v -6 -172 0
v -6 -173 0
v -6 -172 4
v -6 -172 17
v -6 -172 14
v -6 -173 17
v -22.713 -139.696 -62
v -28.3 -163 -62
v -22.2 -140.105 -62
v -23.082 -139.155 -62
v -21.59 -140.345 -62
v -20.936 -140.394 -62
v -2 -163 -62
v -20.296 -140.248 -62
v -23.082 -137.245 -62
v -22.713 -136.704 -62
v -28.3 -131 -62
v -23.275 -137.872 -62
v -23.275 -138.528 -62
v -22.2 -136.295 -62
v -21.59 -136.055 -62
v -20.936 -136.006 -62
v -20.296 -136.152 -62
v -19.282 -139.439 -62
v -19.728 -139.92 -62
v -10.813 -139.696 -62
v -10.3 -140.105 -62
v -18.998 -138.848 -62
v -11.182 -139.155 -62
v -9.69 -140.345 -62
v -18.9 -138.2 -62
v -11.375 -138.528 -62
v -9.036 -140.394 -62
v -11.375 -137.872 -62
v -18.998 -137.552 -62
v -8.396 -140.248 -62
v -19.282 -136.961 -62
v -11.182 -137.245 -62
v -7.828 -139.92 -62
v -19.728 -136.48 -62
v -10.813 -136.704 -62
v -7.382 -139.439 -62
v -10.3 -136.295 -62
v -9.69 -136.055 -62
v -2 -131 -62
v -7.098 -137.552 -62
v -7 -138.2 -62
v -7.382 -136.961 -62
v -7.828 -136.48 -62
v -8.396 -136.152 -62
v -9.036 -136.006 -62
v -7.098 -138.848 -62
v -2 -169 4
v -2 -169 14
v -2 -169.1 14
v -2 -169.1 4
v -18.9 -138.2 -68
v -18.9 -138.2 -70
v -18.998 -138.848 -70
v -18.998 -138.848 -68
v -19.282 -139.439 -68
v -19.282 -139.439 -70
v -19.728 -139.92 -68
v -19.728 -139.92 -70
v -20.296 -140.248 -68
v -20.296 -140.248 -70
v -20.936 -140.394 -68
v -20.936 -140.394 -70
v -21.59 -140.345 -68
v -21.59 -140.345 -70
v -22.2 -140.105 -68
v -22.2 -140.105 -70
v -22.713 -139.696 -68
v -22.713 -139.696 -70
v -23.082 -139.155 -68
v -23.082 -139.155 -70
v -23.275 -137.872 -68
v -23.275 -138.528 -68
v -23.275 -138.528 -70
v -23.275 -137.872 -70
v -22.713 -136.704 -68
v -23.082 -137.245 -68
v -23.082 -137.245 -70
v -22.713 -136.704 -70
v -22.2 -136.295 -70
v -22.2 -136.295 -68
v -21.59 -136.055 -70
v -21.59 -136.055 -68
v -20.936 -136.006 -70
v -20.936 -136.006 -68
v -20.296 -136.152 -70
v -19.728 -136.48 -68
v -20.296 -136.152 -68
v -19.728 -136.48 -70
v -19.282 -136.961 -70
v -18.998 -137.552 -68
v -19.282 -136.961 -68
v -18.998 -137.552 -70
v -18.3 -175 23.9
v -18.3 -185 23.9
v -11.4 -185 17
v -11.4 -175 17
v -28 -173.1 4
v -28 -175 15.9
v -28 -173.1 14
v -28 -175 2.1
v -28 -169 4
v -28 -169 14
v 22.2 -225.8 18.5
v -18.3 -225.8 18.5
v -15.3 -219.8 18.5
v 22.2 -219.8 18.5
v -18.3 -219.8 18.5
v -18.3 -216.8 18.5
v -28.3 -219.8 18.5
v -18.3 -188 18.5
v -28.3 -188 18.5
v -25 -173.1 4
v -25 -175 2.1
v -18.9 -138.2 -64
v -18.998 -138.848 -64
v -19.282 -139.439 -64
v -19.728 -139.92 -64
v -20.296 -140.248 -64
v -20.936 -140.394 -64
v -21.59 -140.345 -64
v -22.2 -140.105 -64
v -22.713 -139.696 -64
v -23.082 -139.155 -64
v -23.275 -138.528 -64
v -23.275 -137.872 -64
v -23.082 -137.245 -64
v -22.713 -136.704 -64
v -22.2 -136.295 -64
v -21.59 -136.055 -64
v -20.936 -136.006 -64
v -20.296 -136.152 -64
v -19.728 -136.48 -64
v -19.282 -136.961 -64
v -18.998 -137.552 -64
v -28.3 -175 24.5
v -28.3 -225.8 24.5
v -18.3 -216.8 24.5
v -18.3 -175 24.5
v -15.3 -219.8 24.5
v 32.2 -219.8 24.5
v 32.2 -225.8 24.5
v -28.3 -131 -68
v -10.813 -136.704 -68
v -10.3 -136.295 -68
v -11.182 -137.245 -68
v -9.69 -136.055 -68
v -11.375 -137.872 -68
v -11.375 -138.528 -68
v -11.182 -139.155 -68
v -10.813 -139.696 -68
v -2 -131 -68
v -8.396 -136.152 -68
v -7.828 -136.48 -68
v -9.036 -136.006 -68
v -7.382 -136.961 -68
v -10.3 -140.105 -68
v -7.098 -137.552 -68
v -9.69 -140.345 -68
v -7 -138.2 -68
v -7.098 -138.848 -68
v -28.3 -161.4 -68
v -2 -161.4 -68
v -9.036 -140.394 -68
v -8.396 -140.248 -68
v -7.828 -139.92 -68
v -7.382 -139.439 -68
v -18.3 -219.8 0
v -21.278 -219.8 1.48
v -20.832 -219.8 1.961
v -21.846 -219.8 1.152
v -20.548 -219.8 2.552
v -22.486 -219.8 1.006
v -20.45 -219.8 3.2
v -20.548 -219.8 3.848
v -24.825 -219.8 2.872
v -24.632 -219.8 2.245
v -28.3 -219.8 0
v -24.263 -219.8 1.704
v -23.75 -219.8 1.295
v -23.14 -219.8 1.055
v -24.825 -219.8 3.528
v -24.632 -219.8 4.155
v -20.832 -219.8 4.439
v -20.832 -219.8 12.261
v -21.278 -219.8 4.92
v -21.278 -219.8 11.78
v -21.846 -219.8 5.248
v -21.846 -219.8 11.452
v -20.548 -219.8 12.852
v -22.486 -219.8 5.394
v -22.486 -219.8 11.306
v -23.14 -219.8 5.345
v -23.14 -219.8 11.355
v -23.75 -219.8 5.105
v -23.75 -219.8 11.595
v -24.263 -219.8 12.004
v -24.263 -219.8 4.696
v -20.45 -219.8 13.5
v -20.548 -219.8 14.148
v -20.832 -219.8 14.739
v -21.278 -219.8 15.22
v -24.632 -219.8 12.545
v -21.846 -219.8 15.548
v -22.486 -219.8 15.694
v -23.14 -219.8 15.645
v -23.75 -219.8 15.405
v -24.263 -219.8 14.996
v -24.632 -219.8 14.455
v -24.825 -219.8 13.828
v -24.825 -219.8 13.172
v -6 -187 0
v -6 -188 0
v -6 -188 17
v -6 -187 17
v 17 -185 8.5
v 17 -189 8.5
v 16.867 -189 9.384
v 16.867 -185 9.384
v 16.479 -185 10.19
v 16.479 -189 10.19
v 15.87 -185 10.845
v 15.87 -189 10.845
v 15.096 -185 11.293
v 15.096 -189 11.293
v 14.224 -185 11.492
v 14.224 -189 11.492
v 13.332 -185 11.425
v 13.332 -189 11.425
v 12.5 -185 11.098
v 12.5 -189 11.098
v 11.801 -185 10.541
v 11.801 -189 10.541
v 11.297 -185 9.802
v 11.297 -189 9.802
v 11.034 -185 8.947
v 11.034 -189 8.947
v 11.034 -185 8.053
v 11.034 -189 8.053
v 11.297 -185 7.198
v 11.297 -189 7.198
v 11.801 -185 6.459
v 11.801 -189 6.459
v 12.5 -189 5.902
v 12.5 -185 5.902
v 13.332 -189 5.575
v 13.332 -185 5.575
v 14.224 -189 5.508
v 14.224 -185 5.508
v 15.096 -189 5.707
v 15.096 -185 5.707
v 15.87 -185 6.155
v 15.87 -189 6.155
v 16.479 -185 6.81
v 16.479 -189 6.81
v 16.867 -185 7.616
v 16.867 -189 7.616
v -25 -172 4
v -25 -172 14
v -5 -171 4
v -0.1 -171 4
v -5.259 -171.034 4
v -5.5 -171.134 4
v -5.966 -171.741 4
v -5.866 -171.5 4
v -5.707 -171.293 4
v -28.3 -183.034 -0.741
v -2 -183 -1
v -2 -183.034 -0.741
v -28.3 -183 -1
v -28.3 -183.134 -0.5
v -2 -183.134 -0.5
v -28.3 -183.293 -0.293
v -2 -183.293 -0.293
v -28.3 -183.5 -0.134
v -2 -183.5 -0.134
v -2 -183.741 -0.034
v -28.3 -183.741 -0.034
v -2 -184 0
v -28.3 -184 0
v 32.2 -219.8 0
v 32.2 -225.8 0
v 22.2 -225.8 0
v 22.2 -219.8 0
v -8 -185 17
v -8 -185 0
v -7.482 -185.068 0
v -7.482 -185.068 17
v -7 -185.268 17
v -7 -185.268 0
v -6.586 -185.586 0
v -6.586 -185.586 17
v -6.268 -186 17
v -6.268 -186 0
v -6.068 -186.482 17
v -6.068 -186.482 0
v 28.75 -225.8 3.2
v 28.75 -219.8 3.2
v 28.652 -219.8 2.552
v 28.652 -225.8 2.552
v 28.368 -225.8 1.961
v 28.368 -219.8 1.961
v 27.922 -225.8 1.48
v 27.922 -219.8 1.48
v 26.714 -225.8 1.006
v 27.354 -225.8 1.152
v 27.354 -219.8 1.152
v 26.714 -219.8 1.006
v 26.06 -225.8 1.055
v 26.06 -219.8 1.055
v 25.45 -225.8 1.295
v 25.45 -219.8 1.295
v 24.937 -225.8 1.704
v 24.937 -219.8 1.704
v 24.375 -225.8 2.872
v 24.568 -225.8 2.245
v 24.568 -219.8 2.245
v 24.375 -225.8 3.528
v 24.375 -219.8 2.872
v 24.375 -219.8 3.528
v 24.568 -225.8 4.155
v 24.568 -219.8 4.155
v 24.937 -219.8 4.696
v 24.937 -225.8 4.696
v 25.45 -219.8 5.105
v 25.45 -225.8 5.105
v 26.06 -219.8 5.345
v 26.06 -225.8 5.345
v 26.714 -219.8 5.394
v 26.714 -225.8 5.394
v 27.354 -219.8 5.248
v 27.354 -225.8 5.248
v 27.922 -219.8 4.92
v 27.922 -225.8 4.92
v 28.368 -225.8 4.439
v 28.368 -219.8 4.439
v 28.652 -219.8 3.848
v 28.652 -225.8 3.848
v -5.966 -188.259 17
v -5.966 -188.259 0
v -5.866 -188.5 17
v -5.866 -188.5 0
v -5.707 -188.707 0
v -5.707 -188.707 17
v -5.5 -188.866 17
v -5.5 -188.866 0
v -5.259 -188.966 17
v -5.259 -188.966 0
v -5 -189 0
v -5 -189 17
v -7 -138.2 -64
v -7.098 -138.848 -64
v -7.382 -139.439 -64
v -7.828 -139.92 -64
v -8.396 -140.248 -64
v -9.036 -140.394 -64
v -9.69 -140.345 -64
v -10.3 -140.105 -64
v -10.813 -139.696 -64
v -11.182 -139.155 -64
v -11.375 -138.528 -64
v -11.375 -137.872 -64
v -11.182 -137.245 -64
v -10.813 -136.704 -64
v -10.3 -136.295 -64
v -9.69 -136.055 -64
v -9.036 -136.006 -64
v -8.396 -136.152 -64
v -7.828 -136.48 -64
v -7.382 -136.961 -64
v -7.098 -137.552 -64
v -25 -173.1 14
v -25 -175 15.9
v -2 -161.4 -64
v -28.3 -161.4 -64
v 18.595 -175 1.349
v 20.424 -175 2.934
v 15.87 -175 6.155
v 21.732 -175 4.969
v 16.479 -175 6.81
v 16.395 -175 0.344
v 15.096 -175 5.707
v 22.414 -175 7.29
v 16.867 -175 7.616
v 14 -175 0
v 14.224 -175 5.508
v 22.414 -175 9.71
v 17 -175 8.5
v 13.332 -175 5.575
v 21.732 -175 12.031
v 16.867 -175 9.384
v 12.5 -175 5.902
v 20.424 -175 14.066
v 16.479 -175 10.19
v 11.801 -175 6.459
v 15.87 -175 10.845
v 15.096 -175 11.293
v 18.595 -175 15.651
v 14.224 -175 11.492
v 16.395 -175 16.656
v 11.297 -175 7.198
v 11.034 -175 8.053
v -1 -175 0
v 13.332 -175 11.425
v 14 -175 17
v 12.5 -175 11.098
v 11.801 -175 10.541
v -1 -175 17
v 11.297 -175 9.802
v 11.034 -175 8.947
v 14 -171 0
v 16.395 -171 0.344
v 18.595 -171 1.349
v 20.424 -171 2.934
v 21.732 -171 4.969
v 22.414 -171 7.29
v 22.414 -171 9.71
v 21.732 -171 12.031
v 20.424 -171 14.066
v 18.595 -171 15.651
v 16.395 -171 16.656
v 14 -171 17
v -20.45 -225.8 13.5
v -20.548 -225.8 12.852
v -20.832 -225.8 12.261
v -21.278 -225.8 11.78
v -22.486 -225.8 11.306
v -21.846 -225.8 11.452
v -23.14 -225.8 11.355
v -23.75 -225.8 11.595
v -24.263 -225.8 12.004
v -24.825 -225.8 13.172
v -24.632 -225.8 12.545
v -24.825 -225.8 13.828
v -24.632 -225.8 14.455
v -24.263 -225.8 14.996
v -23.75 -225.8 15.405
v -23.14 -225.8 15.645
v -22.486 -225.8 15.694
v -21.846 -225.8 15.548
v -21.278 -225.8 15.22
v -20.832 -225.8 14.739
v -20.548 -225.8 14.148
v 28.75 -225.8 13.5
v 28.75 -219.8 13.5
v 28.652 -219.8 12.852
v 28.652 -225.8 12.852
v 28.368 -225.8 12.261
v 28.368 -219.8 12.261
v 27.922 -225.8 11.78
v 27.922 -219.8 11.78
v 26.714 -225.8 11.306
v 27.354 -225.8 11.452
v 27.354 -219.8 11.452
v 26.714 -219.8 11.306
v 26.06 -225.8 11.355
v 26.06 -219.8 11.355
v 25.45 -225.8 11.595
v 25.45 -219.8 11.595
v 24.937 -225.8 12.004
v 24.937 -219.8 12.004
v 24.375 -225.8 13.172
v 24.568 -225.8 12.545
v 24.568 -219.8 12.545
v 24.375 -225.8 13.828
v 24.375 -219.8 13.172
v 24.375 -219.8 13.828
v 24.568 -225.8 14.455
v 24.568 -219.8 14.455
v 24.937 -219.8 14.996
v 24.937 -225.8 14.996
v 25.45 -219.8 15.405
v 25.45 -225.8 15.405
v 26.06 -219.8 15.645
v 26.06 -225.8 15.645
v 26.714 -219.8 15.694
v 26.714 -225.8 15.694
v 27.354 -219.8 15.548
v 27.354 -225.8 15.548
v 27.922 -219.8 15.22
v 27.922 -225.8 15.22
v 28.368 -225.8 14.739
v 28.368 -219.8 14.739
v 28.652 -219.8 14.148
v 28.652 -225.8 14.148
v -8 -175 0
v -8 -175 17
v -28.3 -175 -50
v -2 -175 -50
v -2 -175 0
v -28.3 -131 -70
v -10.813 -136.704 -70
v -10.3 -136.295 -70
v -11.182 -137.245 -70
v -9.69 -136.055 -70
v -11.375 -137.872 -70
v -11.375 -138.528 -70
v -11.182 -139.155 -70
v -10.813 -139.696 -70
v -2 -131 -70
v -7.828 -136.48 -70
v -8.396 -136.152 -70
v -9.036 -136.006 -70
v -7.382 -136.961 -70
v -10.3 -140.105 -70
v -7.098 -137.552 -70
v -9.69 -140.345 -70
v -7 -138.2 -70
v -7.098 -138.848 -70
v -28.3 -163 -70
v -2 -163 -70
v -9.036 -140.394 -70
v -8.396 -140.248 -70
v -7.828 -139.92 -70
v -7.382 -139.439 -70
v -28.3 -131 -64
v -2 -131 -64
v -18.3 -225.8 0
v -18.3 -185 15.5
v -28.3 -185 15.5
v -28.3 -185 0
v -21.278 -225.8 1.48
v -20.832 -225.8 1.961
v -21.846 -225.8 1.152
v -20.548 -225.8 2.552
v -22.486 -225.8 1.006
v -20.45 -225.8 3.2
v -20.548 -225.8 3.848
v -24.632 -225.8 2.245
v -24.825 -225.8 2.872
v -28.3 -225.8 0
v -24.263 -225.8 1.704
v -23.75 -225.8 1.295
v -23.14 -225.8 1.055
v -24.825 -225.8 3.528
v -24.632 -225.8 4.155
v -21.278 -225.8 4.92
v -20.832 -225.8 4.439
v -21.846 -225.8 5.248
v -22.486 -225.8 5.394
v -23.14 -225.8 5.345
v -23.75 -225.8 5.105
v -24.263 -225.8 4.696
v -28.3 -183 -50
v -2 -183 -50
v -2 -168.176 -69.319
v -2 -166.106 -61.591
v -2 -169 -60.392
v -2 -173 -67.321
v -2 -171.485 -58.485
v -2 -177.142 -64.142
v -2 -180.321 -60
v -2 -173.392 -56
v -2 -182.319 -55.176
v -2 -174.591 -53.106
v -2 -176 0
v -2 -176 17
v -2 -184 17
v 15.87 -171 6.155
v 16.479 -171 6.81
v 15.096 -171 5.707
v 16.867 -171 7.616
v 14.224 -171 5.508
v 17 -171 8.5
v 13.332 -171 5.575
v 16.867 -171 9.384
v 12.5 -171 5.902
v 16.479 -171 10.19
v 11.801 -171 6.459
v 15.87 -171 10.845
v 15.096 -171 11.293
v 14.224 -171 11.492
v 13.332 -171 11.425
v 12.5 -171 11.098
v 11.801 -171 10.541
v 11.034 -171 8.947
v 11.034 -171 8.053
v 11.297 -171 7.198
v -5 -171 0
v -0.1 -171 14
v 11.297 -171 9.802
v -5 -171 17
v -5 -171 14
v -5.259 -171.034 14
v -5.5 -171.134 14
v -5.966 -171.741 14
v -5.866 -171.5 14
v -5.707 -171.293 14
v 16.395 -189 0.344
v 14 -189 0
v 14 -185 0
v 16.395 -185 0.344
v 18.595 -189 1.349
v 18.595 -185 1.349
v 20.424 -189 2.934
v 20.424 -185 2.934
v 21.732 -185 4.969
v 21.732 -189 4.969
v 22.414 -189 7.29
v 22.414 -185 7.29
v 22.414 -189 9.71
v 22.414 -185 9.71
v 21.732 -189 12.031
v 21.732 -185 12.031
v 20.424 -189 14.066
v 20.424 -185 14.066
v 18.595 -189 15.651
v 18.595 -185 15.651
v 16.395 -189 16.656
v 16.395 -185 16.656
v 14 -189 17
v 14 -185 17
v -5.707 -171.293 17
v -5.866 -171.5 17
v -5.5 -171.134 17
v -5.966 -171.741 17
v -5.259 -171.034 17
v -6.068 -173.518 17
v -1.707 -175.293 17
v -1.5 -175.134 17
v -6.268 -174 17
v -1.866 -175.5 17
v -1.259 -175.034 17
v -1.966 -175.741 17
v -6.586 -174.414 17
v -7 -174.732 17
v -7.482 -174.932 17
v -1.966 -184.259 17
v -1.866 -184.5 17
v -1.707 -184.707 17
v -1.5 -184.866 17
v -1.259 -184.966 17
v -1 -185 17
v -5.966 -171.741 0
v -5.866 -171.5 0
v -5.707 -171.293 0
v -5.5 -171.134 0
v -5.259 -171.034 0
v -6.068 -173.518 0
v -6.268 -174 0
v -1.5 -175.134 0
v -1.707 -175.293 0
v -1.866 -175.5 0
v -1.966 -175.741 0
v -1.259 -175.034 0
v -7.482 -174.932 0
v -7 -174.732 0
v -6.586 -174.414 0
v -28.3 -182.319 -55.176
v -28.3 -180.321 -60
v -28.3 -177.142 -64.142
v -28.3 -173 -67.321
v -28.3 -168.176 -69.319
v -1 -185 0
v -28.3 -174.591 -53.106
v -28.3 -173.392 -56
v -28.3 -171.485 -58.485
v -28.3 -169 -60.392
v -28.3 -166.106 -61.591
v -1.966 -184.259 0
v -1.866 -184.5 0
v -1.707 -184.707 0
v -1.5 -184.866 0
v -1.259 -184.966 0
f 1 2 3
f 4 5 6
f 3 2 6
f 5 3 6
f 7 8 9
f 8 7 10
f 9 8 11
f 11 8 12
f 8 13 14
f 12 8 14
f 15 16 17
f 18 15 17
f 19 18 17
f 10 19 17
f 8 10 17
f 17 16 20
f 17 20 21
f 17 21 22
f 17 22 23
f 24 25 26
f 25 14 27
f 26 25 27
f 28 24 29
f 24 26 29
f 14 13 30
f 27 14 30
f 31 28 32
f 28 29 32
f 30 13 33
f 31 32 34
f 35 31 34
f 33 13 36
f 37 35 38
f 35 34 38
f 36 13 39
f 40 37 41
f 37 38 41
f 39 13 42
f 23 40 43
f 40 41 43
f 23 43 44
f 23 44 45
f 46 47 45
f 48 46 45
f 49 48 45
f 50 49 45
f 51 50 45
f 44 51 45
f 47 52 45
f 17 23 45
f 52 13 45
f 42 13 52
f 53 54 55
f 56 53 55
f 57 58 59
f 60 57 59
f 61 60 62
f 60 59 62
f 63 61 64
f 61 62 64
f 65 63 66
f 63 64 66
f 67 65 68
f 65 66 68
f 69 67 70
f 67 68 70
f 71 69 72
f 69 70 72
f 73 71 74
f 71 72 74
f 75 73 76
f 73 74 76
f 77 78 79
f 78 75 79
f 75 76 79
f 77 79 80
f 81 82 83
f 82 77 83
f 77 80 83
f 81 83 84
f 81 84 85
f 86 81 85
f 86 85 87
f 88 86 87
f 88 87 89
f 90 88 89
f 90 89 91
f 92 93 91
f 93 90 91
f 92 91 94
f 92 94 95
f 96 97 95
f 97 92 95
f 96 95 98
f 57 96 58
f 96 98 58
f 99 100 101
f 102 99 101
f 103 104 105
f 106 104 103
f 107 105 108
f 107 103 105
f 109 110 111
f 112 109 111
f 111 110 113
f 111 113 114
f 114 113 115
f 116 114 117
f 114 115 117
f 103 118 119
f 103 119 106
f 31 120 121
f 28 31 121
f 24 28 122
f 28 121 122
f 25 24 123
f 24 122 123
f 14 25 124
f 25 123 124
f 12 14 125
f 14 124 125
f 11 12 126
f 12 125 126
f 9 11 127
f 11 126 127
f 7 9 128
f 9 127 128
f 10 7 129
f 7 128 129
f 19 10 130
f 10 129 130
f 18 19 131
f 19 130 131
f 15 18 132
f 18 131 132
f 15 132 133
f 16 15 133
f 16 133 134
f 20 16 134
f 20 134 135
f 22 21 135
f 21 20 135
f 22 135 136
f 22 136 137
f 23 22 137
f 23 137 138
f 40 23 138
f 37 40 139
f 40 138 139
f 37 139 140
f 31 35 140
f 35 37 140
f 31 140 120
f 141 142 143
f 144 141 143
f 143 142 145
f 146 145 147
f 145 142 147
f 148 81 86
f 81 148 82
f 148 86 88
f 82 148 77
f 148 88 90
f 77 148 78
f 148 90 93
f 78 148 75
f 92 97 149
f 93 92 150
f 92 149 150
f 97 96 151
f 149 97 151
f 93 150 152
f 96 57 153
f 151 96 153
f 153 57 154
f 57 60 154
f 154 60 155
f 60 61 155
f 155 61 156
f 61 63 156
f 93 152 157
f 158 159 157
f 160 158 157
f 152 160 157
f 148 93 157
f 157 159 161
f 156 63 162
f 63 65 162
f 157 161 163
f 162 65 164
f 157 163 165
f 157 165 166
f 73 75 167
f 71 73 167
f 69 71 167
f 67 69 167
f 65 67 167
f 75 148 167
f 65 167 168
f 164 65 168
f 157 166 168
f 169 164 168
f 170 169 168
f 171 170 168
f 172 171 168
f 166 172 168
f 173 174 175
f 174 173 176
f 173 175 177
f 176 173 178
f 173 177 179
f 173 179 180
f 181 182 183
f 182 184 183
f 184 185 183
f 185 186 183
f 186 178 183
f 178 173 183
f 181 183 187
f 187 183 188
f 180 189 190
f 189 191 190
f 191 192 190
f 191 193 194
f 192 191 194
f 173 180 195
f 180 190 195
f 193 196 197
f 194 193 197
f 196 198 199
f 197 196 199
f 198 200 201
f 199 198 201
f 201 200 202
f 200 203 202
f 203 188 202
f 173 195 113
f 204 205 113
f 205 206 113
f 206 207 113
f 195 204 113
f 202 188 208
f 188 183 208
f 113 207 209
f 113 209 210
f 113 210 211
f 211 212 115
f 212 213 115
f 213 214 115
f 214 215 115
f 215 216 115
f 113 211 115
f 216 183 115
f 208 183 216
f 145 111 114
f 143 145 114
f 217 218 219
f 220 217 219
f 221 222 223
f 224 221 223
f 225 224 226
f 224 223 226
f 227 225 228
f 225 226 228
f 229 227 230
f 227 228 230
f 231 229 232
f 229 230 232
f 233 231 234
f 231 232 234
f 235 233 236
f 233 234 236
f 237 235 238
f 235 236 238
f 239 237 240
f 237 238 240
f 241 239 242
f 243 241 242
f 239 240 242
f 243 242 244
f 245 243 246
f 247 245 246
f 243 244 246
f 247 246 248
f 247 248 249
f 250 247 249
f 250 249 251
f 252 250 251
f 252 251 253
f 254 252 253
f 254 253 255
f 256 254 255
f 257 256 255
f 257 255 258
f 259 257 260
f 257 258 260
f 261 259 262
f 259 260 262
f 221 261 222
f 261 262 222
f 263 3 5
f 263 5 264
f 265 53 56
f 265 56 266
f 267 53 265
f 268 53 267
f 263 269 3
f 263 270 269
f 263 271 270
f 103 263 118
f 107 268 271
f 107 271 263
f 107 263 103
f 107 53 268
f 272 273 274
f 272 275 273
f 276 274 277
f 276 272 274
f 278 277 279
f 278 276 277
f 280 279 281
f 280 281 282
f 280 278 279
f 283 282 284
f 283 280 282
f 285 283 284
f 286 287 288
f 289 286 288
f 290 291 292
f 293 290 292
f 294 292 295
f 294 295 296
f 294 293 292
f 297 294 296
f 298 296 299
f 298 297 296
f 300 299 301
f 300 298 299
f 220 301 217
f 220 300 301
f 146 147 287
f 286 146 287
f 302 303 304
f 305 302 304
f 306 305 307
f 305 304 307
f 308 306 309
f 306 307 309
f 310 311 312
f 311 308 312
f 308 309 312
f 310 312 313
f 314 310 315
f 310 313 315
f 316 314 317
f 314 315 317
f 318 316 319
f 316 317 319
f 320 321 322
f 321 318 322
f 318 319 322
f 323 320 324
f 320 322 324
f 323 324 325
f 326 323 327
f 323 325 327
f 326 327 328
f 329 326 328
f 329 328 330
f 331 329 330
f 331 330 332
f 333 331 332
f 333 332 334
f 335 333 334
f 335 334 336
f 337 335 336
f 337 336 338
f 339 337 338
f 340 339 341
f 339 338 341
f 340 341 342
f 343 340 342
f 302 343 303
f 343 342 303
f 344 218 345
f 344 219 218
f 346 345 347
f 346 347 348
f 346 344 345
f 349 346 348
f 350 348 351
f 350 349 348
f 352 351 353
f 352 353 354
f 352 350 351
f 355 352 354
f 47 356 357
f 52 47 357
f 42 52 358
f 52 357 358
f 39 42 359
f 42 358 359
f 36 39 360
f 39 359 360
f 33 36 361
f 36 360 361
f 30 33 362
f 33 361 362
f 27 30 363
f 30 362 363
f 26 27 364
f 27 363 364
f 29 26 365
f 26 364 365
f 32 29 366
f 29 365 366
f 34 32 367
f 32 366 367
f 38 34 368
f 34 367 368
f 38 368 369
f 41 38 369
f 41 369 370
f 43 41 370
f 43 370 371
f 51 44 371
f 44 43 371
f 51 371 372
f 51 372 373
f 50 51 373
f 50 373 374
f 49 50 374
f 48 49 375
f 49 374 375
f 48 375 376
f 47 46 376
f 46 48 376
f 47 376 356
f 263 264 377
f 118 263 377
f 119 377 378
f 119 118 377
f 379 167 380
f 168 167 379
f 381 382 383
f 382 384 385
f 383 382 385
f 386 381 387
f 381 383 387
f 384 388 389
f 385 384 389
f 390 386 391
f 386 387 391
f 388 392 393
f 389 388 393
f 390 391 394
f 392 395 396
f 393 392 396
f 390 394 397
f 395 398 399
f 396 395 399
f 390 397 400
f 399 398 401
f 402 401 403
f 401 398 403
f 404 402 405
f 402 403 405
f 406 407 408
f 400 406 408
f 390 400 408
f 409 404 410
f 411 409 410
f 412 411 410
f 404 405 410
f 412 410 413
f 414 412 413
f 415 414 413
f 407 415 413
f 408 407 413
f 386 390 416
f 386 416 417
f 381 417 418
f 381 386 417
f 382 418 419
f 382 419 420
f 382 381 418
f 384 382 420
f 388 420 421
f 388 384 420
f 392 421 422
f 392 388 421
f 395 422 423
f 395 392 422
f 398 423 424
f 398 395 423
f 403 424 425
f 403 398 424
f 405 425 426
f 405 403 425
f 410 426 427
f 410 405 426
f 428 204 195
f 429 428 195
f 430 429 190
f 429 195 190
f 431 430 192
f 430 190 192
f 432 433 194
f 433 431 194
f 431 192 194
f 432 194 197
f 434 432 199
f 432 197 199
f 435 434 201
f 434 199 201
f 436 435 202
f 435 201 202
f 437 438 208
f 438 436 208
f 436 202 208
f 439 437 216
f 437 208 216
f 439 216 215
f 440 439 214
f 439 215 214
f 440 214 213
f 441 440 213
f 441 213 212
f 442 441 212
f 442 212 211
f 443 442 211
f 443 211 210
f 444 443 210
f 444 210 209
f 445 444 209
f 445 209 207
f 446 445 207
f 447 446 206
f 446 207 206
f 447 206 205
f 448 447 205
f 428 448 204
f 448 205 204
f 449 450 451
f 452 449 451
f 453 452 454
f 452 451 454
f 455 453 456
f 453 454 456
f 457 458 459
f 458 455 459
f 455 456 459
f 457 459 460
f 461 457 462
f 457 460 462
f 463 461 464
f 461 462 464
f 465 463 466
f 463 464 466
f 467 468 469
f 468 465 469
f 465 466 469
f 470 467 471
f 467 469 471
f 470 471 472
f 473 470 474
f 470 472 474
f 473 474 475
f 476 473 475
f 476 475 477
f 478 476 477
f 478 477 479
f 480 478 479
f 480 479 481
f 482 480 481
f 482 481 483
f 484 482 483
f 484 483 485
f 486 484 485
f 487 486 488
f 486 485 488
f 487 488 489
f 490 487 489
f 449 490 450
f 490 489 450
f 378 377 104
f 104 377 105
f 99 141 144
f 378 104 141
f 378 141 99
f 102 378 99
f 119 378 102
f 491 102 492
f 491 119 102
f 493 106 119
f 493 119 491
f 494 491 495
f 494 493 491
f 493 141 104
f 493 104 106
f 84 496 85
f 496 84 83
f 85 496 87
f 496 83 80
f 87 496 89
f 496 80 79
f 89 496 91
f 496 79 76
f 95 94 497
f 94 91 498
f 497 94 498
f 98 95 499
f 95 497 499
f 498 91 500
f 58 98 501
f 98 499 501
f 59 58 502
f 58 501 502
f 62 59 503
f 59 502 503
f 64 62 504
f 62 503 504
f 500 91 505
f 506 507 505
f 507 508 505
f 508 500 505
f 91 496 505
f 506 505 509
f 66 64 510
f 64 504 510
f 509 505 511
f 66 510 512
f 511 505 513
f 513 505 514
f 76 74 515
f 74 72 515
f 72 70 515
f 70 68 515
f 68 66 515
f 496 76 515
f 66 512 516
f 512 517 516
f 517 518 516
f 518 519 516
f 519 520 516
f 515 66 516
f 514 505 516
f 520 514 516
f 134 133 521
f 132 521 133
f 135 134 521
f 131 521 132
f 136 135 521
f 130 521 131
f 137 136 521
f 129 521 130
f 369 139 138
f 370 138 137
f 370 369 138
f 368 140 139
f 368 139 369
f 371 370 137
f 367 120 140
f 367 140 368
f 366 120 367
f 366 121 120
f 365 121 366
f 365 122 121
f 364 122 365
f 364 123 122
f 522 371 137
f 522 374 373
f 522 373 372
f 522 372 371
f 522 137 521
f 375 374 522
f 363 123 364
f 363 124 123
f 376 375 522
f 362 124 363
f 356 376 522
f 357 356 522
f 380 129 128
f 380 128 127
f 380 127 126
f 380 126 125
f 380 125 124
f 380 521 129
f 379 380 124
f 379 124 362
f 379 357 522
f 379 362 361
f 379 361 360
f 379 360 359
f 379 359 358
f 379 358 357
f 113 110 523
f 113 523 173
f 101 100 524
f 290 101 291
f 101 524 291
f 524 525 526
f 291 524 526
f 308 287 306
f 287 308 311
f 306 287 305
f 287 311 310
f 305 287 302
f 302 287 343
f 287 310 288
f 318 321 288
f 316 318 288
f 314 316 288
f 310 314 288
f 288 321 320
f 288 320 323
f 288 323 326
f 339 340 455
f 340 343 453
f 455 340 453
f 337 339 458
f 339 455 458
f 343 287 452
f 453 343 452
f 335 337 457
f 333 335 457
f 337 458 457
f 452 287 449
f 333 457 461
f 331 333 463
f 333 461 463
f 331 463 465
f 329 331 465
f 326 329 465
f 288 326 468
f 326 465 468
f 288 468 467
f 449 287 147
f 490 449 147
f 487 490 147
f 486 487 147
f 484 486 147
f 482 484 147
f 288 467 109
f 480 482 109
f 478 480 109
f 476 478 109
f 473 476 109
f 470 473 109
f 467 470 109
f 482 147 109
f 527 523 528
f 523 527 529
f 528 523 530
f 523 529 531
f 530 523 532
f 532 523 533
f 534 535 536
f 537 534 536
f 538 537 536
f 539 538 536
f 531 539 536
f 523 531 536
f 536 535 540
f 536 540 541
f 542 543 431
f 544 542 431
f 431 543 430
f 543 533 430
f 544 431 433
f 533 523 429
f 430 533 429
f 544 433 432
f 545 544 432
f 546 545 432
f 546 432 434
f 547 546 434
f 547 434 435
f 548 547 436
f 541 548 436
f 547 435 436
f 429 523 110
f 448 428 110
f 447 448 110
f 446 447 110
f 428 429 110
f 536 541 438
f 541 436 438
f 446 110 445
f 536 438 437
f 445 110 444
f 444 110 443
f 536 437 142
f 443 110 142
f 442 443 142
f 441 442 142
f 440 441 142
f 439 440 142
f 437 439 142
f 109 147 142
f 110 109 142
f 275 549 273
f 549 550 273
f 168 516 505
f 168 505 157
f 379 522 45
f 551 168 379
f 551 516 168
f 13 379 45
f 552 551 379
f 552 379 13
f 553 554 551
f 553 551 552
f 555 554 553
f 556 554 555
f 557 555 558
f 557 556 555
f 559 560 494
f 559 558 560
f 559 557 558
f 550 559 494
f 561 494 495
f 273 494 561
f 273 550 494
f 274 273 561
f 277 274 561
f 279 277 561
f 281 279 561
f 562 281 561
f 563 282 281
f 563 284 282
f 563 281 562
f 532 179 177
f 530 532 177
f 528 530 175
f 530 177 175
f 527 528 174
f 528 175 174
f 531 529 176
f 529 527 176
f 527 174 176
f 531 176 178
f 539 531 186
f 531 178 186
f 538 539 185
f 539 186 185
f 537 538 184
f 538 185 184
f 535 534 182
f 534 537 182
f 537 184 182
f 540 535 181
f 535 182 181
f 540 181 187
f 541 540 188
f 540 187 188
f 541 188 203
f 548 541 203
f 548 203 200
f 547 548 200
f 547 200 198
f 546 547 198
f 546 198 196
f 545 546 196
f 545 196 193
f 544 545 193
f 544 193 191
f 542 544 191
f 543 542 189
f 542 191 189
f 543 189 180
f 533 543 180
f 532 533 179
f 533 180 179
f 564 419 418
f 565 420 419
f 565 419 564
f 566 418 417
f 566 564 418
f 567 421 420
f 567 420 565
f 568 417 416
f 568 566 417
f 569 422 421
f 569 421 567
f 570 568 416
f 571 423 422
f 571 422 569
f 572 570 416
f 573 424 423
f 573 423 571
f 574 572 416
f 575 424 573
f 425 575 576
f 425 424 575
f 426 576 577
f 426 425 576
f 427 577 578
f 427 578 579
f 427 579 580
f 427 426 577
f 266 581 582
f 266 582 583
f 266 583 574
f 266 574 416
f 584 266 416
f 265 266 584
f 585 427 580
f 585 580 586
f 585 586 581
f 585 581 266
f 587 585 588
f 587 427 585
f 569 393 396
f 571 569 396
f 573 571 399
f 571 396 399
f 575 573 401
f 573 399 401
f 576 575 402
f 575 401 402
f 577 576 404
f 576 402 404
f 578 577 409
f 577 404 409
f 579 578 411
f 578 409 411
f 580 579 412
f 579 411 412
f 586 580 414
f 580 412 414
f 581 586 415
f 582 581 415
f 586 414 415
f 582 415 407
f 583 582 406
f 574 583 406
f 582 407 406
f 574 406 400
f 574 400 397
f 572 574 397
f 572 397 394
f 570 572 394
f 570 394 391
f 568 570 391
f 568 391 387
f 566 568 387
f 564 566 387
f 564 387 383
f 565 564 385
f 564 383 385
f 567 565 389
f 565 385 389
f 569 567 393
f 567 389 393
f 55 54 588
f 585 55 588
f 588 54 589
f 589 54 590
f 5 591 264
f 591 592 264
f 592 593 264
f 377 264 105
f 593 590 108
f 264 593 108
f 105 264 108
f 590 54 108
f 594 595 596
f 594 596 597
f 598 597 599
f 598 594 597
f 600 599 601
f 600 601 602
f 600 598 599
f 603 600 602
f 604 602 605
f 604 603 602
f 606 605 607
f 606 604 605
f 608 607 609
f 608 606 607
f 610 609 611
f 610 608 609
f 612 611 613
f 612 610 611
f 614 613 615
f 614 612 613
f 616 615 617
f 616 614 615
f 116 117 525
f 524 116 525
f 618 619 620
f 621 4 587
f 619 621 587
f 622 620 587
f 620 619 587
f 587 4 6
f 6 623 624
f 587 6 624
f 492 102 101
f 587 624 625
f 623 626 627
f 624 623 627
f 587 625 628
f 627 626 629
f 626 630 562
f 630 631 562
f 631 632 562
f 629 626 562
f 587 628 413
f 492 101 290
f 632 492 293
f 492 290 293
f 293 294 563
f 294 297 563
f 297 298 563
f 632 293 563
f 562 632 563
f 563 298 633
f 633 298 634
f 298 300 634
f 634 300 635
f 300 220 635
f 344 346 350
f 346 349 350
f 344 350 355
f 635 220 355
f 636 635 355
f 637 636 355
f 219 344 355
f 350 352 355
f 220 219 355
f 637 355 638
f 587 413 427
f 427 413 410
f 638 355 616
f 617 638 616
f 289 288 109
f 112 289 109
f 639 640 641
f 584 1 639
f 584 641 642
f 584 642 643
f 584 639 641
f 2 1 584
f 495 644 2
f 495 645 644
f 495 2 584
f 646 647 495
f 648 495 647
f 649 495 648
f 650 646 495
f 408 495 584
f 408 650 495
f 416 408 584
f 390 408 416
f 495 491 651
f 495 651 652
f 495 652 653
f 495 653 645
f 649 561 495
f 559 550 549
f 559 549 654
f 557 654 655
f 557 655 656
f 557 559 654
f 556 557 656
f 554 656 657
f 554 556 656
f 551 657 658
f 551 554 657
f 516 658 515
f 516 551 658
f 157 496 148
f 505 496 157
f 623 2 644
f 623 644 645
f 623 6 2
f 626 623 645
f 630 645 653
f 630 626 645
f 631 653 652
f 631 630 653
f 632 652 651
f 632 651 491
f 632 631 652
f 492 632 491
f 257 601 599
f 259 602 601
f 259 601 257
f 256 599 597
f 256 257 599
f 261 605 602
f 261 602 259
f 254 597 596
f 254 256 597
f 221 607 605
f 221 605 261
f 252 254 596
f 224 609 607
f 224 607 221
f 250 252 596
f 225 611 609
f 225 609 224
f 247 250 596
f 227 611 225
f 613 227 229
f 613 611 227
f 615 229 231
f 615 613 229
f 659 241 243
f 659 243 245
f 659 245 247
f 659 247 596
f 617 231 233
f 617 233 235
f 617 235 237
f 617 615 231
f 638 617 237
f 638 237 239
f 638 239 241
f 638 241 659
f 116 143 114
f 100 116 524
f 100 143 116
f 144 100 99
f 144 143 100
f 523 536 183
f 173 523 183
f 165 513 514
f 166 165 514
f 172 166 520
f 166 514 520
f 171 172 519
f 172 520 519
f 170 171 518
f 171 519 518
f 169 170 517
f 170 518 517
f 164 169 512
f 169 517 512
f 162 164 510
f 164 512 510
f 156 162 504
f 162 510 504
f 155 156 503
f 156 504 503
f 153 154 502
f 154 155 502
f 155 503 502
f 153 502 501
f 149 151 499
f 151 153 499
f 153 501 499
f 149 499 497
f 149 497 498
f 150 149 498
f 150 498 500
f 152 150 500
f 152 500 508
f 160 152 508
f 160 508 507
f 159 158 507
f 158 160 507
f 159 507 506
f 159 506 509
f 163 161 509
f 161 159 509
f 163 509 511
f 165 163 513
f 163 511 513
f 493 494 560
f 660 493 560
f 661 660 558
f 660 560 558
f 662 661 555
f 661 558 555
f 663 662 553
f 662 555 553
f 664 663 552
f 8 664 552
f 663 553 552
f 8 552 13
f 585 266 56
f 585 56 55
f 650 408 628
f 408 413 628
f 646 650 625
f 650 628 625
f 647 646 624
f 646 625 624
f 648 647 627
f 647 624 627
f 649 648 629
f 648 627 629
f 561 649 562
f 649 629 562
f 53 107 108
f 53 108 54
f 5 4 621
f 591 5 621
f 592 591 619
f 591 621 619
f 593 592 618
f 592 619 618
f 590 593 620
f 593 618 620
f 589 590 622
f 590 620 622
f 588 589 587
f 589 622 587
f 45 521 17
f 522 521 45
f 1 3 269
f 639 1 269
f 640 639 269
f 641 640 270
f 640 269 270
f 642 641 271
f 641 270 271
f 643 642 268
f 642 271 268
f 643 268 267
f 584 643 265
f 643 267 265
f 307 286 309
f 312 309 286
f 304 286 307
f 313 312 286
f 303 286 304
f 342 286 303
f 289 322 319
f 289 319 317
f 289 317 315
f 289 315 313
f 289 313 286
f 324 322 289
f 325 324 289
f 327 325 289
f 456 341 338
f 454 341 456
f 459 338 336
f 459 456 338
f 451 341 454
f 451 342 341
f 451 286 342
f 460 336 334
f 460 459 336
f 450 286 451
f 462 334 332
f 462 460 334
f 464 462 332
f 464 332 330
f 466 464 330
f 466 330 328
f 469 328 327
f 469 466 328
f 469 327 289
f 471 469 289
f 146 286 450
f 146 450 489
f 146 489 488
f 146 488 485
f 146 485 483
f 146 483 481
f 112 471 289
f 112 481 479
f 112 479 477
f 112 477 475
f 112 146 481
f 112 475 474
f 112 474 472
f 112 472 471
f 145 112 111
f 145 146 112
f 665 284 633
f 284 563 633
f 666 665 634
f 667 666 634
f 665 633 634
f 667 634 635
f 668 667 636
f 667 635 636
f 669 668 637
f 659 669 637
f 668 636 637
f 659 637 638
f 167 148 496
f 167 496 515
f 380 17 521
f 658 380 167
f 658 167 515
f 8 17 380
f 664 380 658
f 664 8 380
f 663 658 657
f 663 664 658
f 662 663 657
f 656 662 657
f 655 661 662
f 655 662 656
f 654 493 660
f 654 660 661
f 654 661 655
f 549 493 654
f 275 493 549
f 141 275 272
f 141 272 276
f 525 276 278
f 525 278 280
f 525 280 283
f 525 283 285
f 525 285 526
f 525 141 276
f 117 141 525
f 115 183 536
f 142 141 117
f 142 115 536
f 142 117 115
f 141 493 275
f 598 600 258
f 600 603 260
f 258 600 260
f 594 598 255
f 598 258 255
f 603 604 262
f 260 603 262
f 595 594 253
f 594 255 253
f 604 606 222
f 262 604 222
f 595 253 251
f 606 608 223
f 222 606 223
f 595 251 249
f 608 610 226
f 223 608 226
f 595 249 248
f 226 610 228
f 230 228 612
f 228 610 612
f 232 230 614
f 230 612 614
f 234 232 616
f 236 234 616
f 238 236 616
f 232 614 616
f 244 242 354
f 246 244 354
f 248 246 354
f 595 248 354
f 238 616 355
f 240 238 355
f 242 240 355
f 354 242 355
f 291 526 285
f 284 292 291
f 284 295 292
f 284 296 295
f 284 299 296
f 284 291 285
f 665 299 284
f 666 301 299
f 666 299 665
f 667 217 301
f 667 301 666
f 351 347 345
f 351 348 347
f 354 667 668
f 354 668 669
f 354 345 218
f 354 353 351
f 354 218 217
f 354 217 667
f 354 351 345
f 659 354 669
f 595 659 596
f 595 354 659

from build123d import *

# Parameters (mm, degrees)
CYLINDER041_R          = 2.2
CYLINDER041_DEPTH      = 26
ARRAY015_X_COUNT       = 2
ARRAY015_X_PITCH       = 11.9
BOX056_W               = 26.3
BOX056_H               = 84
BOX056_DEPTH           = 8
BOX055_W               = 26.3
BOX055_H               = 144.8
BOX055_DEPTH           = 4
PAD070_DEPTH           = 10
PAD071_DEPTH           = 6
BOX054_W               = 80
BOX054_H               = 100
BOX054_DEPTH           = 100
BOX053_W               = 40
BOX053_H               = 84
BOX053_DEPTH           = 10
PAD065_DEPTH           = 10
PAD064_DEPTH           = 10
BOX051_W               = 12
BOX051_H               = 10
BOX051_DEPTH           = 30
CYLINDER039_R          = 2.2
CYLINDER039_DEPTH      = 18
CYLINDER039_ROLL_ANGLE = -90
ARRAY013_X_COUNT       = 2
ARRAY013_X_PITCH       = 49.2
ARRAY013_Z_COUNT       = 2
ARRAY013_Z_PITCH       = 10.3
PAD061_DEPTH           = 6
PAD060_DEPTH           = 10
BOX052_W               = 12
BOX052_H               = 10
BOX052_DEPTH           = 30
CYLINDER040_R          = 2.2
CYLINDER040_DEPTH      = 18
CYLINDER040_ROLL_ANGLE = -90
ARRAY014_X_COUNT       = 2
ARRAY014_X_PITCH       = 49.2
ARRAY014_Z_COUNT       = 2
ARRAY014_Z_PITCH       = 10.3
PAD063_DEPTH           = 6
PAD062_DEPTH           = 10
BOX050_W               = 16.3
BOX050_H               = 10
BOX050_DEPTH           = 17
SKETCH057_R            = 3
PAD058_DEPTH           = 4
SKETCH058_R            = 3
PAD059_DEPTH           = 4
BOX049_W               = 20
BOX049_H               = 17
BOX049_DEPTH           = 10
FILLET021_R            = 1
FILLET021_ROLL_ANGLE   = 90
FILLET022_1_R          = 2
FILLET022_2_R          = 1
BOX046_W               = 16.3
BOX046_H               = 10
BOX046_DEPTH           = 17
SKETCH053_R            = 3
PAD055_DEPTH           = 4
SKETCH054_R            = 3
PAD056_DEPTH           = 4
BOX045_W               = 20
BOX045_H               = 17
BOX045_DEPTH           = 10
FILLET019_R            = 1
FILLET019_ROLL_ANGLE   = 90
FILLET020_1_R          = 2
FILLET020_2_R          = 1
PAD054_DEPTH           = 26.3
CHAMFER008_SIZE        = 1.9
FILLET024_1_R          = 1.5
FILLET024_2_R          = 1
PAD069_DEPTH           = 10


with BuildPart() as taladros_cadera001:
    # Cylinder041 → Cylinder041 (new body)
    with BuildSketch(Plane(origin=(-9.2, -39.8, -80), x_dir=(1, 0, 0), z_dir=(0, 0, 1))):
        Circle(CYLINDER041_R)
    extrude(amount=CYLINDER041_DEPTH)

    # Array015 X: Taladros_cadera001 ×2


with BuildPart() as taladros_cadera001_1:
    add(taladros_cadera001.part)
    with Locations(*[(-i * ARRAY015_X_PITCH, 0, 0) for i in range(1, ARRAY015_X_COUNT)]):
        add(taladros_cadera001.part)


with BuildPart() as cadera_base_centro002:
    # Box056 → Box056 (new body)
    with BuildSketch(Plane(origin=(-28.3, -133, -70), x_dir=(1, 0, 0), z_dir=(0, 0, 1))):
        with Locations((13.15, 42)):
            Rectangle(BOX056_W, BOX056_H)
    extrude(amount=BOX056_DEPTH)


with BuildPart() as cadera_centro001:
    # Box055 → Box055 (new body)
    with BuildSketch(Plane(origin=(-28.3, -163.4, -68), x_dir=(1, 0, 0), z_dir=(0, 0, 1))):
        with Locations((13.15, 72.4)):
            Rectangle(BOX055_W, BOX055_H)
    extrude(amount=BOX055_DEPTH)

    # Fusion009003065: union Cadera_base_centro002
    add(cadera_base_centro002.part)


with BuildPart() as cadera_centro001_1:
    # Fusion009003065 placement: moved
    add(cadera_centro001.part.moved(Location((0, 2, 0))))


with BuildPart() as refuerzo012:
    # Sketch070 → Pad070 (new body)
    with BuildSketch(Plane(origin=(-28.3, 7, 18.5), x_dir=(0, 0, -1), z_dir=(1, 0, 0))):
        Polygon((0, 0), (0, 3), (3, 0), align=None)
    extrude(amount=PAD070_DEPTH)


with BuildPart() as refuerzo013:
    # Sketch071 → Pad071 (new body)
    with BuildSketch(Plane(origin=(-18.3, 41.8, 18.5), x_dir=(0, -1, 0), z_dir=(0, 0, 1))):
        Polygon((0, 0), (0, 3), (3, 0), align=None)
    extrude(amount=PAD071_DEPTH)


with BuildPart() as cortar_extremo_cadera001:
    # Box054 → Box054 (new body)
    with BuildSketch(Plane(origin=(-40, -229, -71), x_dir=(1, 0, 0), z_dir=(0, 0, 1))):
        with Locations((40, 50)):
            Rectangle(BOX054_W, BOX054_H)
    extrude(amount=BOX054_DEPTH)


with BuildPart() as corte_cadera001:
    # Box053 → Box053 (new body)
    with BuildSketch(Plane(origin=(-33, -131, -71), x_dir=(1, 0, 0), z_dir=(0, 0, 1))):
        with Locations((20, 42)):
            Rectangle(BOX053_W, BOX053_H)
    extrude(amount=BOX053_DEPTH)


with BuildPart() as suje_cadera003:
    # Sketch064 → Pad065 (new body)
    with BuildSketch(Plane(origin=(-28, -127, 4), x_dir=(1, 0, 0), z_dir=(0, 0, 1))):
        Polygon((0, 0), (0, 6), (26, 6), (26, 0), (23, 0), (23, 3), (3, 3), (3, 0), align=None)
    extrude(amount=PAD065_DEPTH)


with BuildPart() as suje_cadera1_mirror001:
    # Part__Mirroring011: instance of suje_cadera003
    add(suje_cadera003.part.mirror(Plane(origin=(0, 0, 0), x_dir=(1, 0, 0), z_dir=(0, 1, 0))))


with BuildPart() as suje_cadera1_mirror001_1:
    # Part__Mirroring011 placement: moved
    add(suje_cadera1_mirror001.part.moved(Location((0, -130, 0))))


with BuildPart() as sujetadores_cadera001:
    # Sketch063 → Pad064 (new body)
    with BuildSketch(Plane(origin=(-28, -175, 4), x_dir=(1, 0, 0), z_dir=(0, 0, 1))):
        Polygon((0, 0), (0, 6), (26, 6), (26, 0), (23, 0), (23, 3), (3, 3), (3, 0), align=None)
    extrude(amount=PAD064_DEPTH)

    # Fusion009003063: union suje_cadera1_Mirror001
    add(suje_cadera1_mirror001_1.part)


with BuildPart() as resta_sujetador_cadera002:
    # Box051 → Box051 (new body)
    with BuildSketch(Plane(origin=(-29.5, -13, 0), x_dir=(1, 0, 0), z_dir=(0, 0, 1))):
        with Locations((6, 5)):
            Rectangle(BOX051_W, BOX051_H)
    extrude(amount=BOX051_DEPTH)


with BuildPart() as taladros_suje_motor004:
    # Cylinder039 → Cylinder039 (new body)
    with BuildSketch(Plane.XY):
        Circle(CYLINDER039_R)
    extrude(amount=CYLINDER039_DEPTH)


with BuildPart() as taladros_suje_motor004_1:
    # Cylinder039 roll: moved
    add(taladros_suje_motor004.part.rotate(Axis((0, 0, 0), (1, 0, 0)), CYLINDER039_ROLL_ANGLE))


with BuildPart() as taladros_suje_motor004_2:
    # Cylinder039 placement: moved
    add(taladros_suje_motor004_1.part.moved(Location((150.075, 41, 13.5))))

    # Array013 X: Taladros_suje_motor004 ×2


with BuildPart() as taladros_suje_motor004_3:
    add(taladros_suje_motor004_2.part)
    with Locations(*[(i * ARRAY013_X_PITCH, 0, 0) for i in range(1, ARRAY013_X_COUNT)]):
        add(taladros_suje_motor004_2.part)

    # Array013 Z: Taladros_suje_motor004 ×2


with BuildPart() as taladros_suje_motor004_4:
    add(taladros_suje_motor004_3.part)
    with Locations(*[(0, 0, -i * ARRAY013_Z_PITCH) for i in range(1, ARRAY013_Z_COUNT)]):
        add(taladros_suje_motor004_3.part)


with BuildPart() as suje_motor013:
    # Sketch060 → Pad061 (new body)
    with BuildSketch(Plane(origin=(10, 54.8, 0), x_dir=(1, 0, 0), z_dir=(0, -1, 0))):
        Polygon((0, 18.5), (0, 24.5), (50.5, 24.5), (50.5, 0), (40.5, 0), (40.5, 18.5), align=None)
    extrude(amount=PAD061_DEPTH)


with BuildPart() as sujetador_cadera_full003:
    # Sketch059 → Pad060 (new body)
    with BuildSketch(Plane.YZ):
        Polygon((14, 0), (0, 0), (0, 24.5), (54.8, 24.5), (54.8, 0), (48.8, 0), (48.8, 18.5), (14, 18.5), align=None)
    extrude(amount=PAD060_DEPTH)

    # Fusion009003060: union Suje_motor013
    add(suje_motor013.part)


with BuildPart() as sujetador_cadera_full003_1:
    # Fusion009003060 placement: moved
    add(sujetador_cadera_full003.part.moved(Location((144.425, -3, 0))))

    # Cut041: cut Taladros_suje_motor004
    add(taladros_suje_motor004_4.part, mode=Mode.SUBTRACT)


with BuildPart() as sujetador_cadera_full003_2:
    # Cut041 placement: moved
    add(sujetador_cadera_full003_1.part.moved(Location((-172.725, -4, 0))))

    # Cut042: cut Resta_sujetador_cadera002
    add(resta_sujetador_cadera002.part, mode=Mode.SUBTRACT)


with BuildPart() as resta_sujetador_cadera003:
    # Box052 → Box052 (new body)
    with BuildSketch(Plane(origin=(-29.5, -13, 0), x_dir=(1, 0, 0), z_dir=(0, 0, 1))):
        with Locations((6, 5)):
            Rectangle(BOX052_W, BOX052_H)
    extrude(amount=BOX052_DEPTH)


with BuildPart() as taladros_suje_motor005:
    # Cylinder040 → Cylinder040 (new body)
    with BuildSketch(Plane.XY):
        Circle(CYLINDER040_R)
    extrude(amount=CYLINDER040_DEPTH)


with BuildPart() as taladros_suje_motor005_1:
    # Cylinder040 roll: moved
    add(taladros_suje_motor005.part.rotate(Axis((0, 0, 0), (1, 0, 0)), CYLINDER040_ROLL_ANGLE))


with BuildPart() as taladros_suje_motor005_2:
    # Cylinder040 placement: moved
    add(taladros_suje_motor005_1.part.moved(Location((150.075, 41, 13.5))))

    # Array014 X: Taladros_suje_motor005 ×2


with BuildPart() as taladros_suje_motor005_3:
    add(taladros_suje_motor005_2.part)
    with Locations(*[(i * ARRAY014_X_PITCH, 0, 0) for i in range(1, ARRAY014_X_COUNT)]):
        add(taladros_suje_motor005_2.part)

    # Array014 Z: Taladros_suje_motor005 ×2


with BuildPart() as taladros_suje_motor005_4:
    add(taladros_suje_motor005_3.part)
    with Locations(*[(0, 0, -i * ARRAY014_Z_PITCH) for i in range(1, ARRAY014_Z_COUNT)]):
        add(taladros_suje_motor005_3.part)


with BuildPart() as suje_motor016:
    # Sketch062 → Pad063 (new body)
    with BuildSketch(Plane(origin=(10, 54.8, 0), x_dir=(1, 0, 0), z_dir=(0, -1, 0))):
        Polygon((0, 18.5), (0, 24.5), (50.5, 24.5), (50.5, 0), (40.5, 0), (40.5, 18.5), align=None)
    extrude(amount=PAD063_DEPTH)


with BuildPart() as sujetador_cadera_full004:
    # Sketch061 → Pad062 (new body)
    with BuildSketch(Plane.YZ):
        Polygon((14, 0), (0, 0), (0, 24.5), (54.8, 24.5), (54.8, 0), (48.8, 0), (48.8, 18.5), (14, 18.5), align=None)
    extrude(amount=PAD062_DEPTH)

    # Fusion009003061: union Suje_motor016
    add(suje_motor016.part)


with BuildPart() as sujetador_cadera_full004_1:
    # Fusion009003061 placement: moved
    add(sujetador_cadera_full004.part.moved(Location((144.425, -3, 0))))

    # Cut043: cut Taladros_suje_motor005
    add(taladros_suje_motor005_4.part, mode=Mode.SUBTRACT)


with BuildPart() as sujetador_cadera_full004_2:
    # Cut043 placement: moved
    add(sujetador_cadera_full004_1.part.moved(Location((-172.725, -4, 0))))

    # Cut044: cut Resta_sujetador_cadera003
    add(resta_sujetador_cadera003.part, mode=Mode.SUBTRACT)


with BuildPart() as sujetador_cadera_full_mirror001:
    # Part__Mirroring010: instance of Sujetador_cadera_full004
    add(sujetador_cadera_full004_2.part.mirror(Plane(origin=(0, 0, 0), x_dir=(1, 0, 0), z_dir=(0, 1, 0))))


with BuildPart() as sujetador_cadera_full_mirror001_1:
    # Part__Mirroring010 placement: moved
    add(sujetador_cadera_full_mirror001.part.moved(Location((0, -178, 0))))


with BuildPart() as cubo_externo003:
    # Box050 → Box050 (new body)
    with BuildSketch(Plane(origin=(-26.3, -8, 0), x_dir=(1, 0, 0), z_dir=(0, 0, 1))):
        with Locations((8.15, 5)):
            Rectangle(BOX050_W, BOX050_H)
    extrude(amount=BOX050_DEPTH)


with BuildPart() as ciculo_gancho011:
    # Sketch057 → Pad058 (new body)
    with BuildSketch(Plane.XY):
        with BuildLine():
            Line((0, 17), (20, 17))
            ThreePointArc((20, 0), (28.500019, 8.5), (20, 17))
            Line((20, 0), (0, 0))
            Line((0, 0), (0, 17))
        make_face()
        with Locations((20.000019, 8.5)):
            Circle(SKETCH057_R, mode=Mode.SUBTRACT)
    extrude(amount=PAD058_DEPTH)


with BuildPart() as ciculo_gancho012:
    # Sketch058 → Pad059 (new body)
    with BuildSketch(Plane.XY.offset(14)):
        with BuildLine():
            Line((0, 17), (20, 17))
            ThreePointArc((20, 0), (28.500019, 8.5), (20, 17))
            Line((20, 0), (0, 0))
            Line((0, 0), (0, 17))
        make_face()
        with Locations((20.000019, 8.5)):
            Circle(SKETCH058_R, mode=Mode.SUBTRACT)
    extrude(amount=PAD059_DEPTH)


with BuildPart() as gancho_cadera003:
    # Box049 → Box049 (new body)
    with BuildSketch(Plane(origin=(-16, 0, 4), x_dir=(1, 0, 0), z_dir=(0, 0, 1))):
        with Locations((10, 8.5)):
            Rectangle(BOX049_W, BOX049_H)
    extrude(amount=BOX049_DEPTH)

    # Fusion009003056: union Ciculo_gancho011, Ciculo_gancho012
    add(ciculo_gancho011.part)
    add(ciculo_gancho012.part)

    # Fillet021
    fillet021_edges = [gancho_cadera003.edges().sort_by_distance(p)[0] for p in [
        (0, 8.5, 18),
        (-16, 0, 9),
        (-16, 17, 9),
        (0, 8.5, 0),
    ]]
    fillet(fillet021_edges, radius=FILLET021_R)


with BuildPart() as gancho_cadera003_1:
    # Fillet021 roll: moved
    add(gancho_cadera003.part.rotate(Axis((0, 0, 0), (1, 0, 0)), FILLET021_ROLL_ANGLE))


with BuildPart() as gancho_cadera003_2:
    # Fillet021 placement: moved
    add(gancho_cadera003_1.part.moved(Location((16, 15, 0))))

    # Fillet022 1
    fillet022_1_edges = [gancho_cadera003_2.edges().sort_by_distance(p)[0] for p in [
        (16, 1, 8.5),
        (16, 11, 8.5),
    ]]
    fillet(fillet022_1_edges, radius=FILLET022_1_R)

    # Fillet022 2
    fillet022_2_edges = [gancho_cadera003_2.edges().sort_by_distance(p)[0] for p in [
        (20, 1, 8.5),
        (20, 11, 8.5),
    ]]
    fillet(fillet022_2_edges, radius=FILLET022_2_R)


with BuildPart() as gancho_cadera003_3:
    # Fillet022 placement: moved
    add(gancho_cadera003_2.part.moved(Location((-20, -9, 0))))

    # Fusion009003057: union Cubo_externo003
    add(cubo_externo003.part)


with BuildPart() as gancho_cadera003_4:
    # Fusion009003057 placement: moved
    add(gancho_cadera003_3.part.moved(Location((0, -182, 0))))


with BuildPart() as cubo_externo002:
    # Box046 → Box046 (new body)
    with BuildSketch(Plane(origin=(-26.3, -8, 0), x_dir=(1, 0, 0), z_dir=(0, 0, 1))):
        with Locations((8.15, 5)):
            Rectangle(BOX046_W, BOX046_H)
    extrude(amount=BOX046_DEPTH)


with BuildPart() as ciculo_gancho009:
    # Sketch053 → Pad055 (new body)
    with BuildSketch(Plane.XY):
        with BuildLine():
            Line((0, 17), (20, 17))
            ThreePointArc((20, 0), (28.500019, 8.5), (20, 17))
            Line((20, 0), (0, 0))
            Line((0, 0), (0, 17))
        make_face()
        with Locations((20.000019, 8.5)):
            Circle(SKETCH053_R, mode=Mode.SUBTRACT)
    extrude(amount=PAD055_DEPTH)


with BuildPart() as ciculo_gancho010:
    # Sketch054 → Pad056 (new body)
    with BuildSketch(Plane.XY.offset(14)):
        with BuildLine():
            Line((0, 17), (20, 17))
            ThreePointArc((20, 0), (28.500019, 8.5), (20, 17))
            Line((20, 0), (0, 0))
            Line((0, 0), (0, 17))
        make_face()
        with Locations((20.000019, 8.5)):
            Circle(SKETCH054_R, mode=Mode.SUBTRACT)
    extrude(amount=PAD056_DEPTH)


with BuildPart() as ganchos_cadera001:
    # Box045 → Box045 (new body)
    with BuildSketch(Plane(origin=(-16, 0, 4), x_dir=(1, 0, 0), z_dir=(0, 0, 1))):
        with Locations((10, 8.5)):
            Rectangle(BOX045_W, BOX045_H)
    extrude(amount=BOX045_DEPTH)

    # Fusion009003052: union Ciculo_gancho009, Ciculo_gancho010
    add(ciculo_gancho009.part)
    add(ciculo_gancho010.part)

    # Fillet019
    fillet019_edges = [ganchos_cadera001.edges().sort_by_distance(p)[0] for p in [
        (0, 8.5, 18),
        (-16, 0, 9),
        (-16, 17, 9),
        (0, 8.5, 0),
    ]]
    fillet(fillet019_edges, radius=FILLET019_R)


with BuildPart() as ganchos_cadera001_1:
    # Fillet019 roll: moved
    add(ganchos_cadera001.part.rotate(Axis((0, 0, 0), (1, 0, 0)), FILLET019_ROLL_ANGLE))


with BuildPart() as ganchos_cadera001_2:
    # Fillet019 placement: moved
    add(ganchos_cadera001_1.part.moved(Location((16, 15, 0))))

    # Fillet020 1
    fillet020_1_edges = [ganchos_cadera001_2.edges().sort_by_distance(p)[0] for p in [
        (16, 1, 8.5),
        (16, 11, 8.5),
    ]]
    fillet(fillet020_1_edges, radius=FILLET020_1_R)

    # Fillet020 2
    fillet020_2_edges = [ganchos_cadera001_2.edges().sort_by_distance(p)[0] for p in [
        (20, 1, 8.5),
        (20, 11, 8.5),
    ]]
    fillet(fillet020_2_edges, radius=FILLET020_2_R)


with BuildPart() as ganchos_cadera001_3:
    # Fillet020 placement: moved
    add(ganchos_cadera001_2.part.moved(Location((-20, -9, 0))))

    # Fusion009003055: union Cubo_externo002
    add(cubo_externo002.part)

    # Fusion009003058: union Gancho_cadera003
    add(gancho_cadera003_4.part)


with BuildPart() as cadera_extremo_izquierdo_base001:
    # Sketch055 → Pad054 (new body)
    with BuildSketch(Plane(origin=(0, 0, 0), x_dir=(0, 1, 0), z_dir=(-1, 0, 0))):
        with BuildLine():
            Line((-188, 0), (-188, 50))
            ThreePointArc((-168, 70), (-182.142136, 64.142136), (-188, 50))
            Line((-168, 70), (-20, 70))
            ThreePointArc((0, 50), (-5.857864, 64.142136), (-20, 70))
            Line((0, 50), (0, 0))
            Line((0, 0), (-8, 0))
            Line((-8, 0), (-8, 50))
            ThreePointArc((-8, 50), (-11.514719, 58.485281), (-20, 62))
            Line((-20, 62), (-168, 62))
            ThreePointArc((-168, 62), (-176.485281, 58.485281), (-180, 50))
            Line((-180, 50), (-180, 0))
            Line((-180, 0), (-188, 0))
        make_face()
    extrude(amount=PAD054_DEPTH)

    # Fusion009003059: union Ganchos_cadera001
    add(ganchos_cadera001_3.part)


with BuildPart() as cadera_extremo_izquierdo_base001_1:
    # Fusion009003059 placement: moved
    add(cadera_extremo_izquierdo_base001.part.moved(Location((-2, 5, 0))))

    # Fusion009003062: union Sujetador_cadera_full003, Sujetador_cadera_full Mirror001
    add(sujetador_cadera_full003_2.part)
    add(sujetador_cadera_full_mirror001_1.part)

    # Fusion009003064: union Sujetadores_cadera001
    add(sujetadores_cadera001.part)

    # Chamfer008
    chamfer008_edges = [cadera_extremo_izquierdo_base001_1.edges().sort_by_distance(p)[0] for p in [
        (-2, -7, 9),
        (-26.5, -3, 14),
        (-26.5, -3, 4),
        (-26.5, -175, 14),
        (-26.5, -175, 4),
        (-2, -171, 9),
    ]]
    chamfer(chamfer008_edges, length=CHAMFER008_SIZE)

    # Fillet024 1
    fillet024_1_edges = [cadera_extremo_izquierdo_base001_1.edges().sort_by_distance(p)[0] for p in [
        (-18.3, 2, 17),
        (-18.3, -180, 17),
    ]]
    fillet(fillet024_1_edges, radius=FILLET024_1_R)

    # Fillet024 2
    fillet024_2_edges = [cadera_extremo_izquierdo_base001_1.edges().sort_by_distance(p)[0] for p in [
        (-15.15, 5, 0),
        (-15.15, -183, 0),
    ]]
    fillet(fillet024_2_edges, radius=FILLET024_2_R)

    # Cut045: cut Corte_cadera001
    add(corte_cadera001.part, mode=Mode.SUBTRACT)

    # Cut046: cut Cortar_extremo_cadera001
    add(cortar_extremo_cadera001.part, mode=Mode.SUBTRACT)


with BuildPart() as cadera_izquierda_full001:
    # Sketch069 → Pad069 (new body)
    with BuildSketch(Plane(origin=(-18.4, 7, 17), x_dir=(1, 0, 0), z_dir=(0, -1, 0))):
        Polygon((0, 0), (0, 7), (7, 0), align=None)
    extrude(amount=PAD069_DEPTH)

    # Fusion009003067: union Refuerzo012, Refuerzo013, Cadera_extremo_izquierdo_base001
    add(refuerzo012.part)
    add(refuerzo013.part)
    add(cadera_extremo_izquierdo_base001_1.part)

    # Cut047: cut Cadera_centro001
    add(cadera_centro001_1.part, mode=Mode.SUBTRACT)

    # Cut048: cut Taladros_cadera001
    add(taladros_cadera001_1.part, mode=Mode.SUBTRACT)


with BuildPart() as cadera_derecha_full:
    # Part__Mirroring013: instance of Cadera_izquierda_full001
    add(cadera_izquierda_full001.part.mirror(Plane(origin=(0, 0, 0), x_dir=(1, 0, 0), z_dir=(0, 1, 0))))


with BuildPart() as cadera_derecha_full_1:
    # Part__Mirroring013 placement: moved
    add(cadera_derecha_full.part.moved(Location((0, -178, 0))))


solid = cadera_derecha_full_1.part
